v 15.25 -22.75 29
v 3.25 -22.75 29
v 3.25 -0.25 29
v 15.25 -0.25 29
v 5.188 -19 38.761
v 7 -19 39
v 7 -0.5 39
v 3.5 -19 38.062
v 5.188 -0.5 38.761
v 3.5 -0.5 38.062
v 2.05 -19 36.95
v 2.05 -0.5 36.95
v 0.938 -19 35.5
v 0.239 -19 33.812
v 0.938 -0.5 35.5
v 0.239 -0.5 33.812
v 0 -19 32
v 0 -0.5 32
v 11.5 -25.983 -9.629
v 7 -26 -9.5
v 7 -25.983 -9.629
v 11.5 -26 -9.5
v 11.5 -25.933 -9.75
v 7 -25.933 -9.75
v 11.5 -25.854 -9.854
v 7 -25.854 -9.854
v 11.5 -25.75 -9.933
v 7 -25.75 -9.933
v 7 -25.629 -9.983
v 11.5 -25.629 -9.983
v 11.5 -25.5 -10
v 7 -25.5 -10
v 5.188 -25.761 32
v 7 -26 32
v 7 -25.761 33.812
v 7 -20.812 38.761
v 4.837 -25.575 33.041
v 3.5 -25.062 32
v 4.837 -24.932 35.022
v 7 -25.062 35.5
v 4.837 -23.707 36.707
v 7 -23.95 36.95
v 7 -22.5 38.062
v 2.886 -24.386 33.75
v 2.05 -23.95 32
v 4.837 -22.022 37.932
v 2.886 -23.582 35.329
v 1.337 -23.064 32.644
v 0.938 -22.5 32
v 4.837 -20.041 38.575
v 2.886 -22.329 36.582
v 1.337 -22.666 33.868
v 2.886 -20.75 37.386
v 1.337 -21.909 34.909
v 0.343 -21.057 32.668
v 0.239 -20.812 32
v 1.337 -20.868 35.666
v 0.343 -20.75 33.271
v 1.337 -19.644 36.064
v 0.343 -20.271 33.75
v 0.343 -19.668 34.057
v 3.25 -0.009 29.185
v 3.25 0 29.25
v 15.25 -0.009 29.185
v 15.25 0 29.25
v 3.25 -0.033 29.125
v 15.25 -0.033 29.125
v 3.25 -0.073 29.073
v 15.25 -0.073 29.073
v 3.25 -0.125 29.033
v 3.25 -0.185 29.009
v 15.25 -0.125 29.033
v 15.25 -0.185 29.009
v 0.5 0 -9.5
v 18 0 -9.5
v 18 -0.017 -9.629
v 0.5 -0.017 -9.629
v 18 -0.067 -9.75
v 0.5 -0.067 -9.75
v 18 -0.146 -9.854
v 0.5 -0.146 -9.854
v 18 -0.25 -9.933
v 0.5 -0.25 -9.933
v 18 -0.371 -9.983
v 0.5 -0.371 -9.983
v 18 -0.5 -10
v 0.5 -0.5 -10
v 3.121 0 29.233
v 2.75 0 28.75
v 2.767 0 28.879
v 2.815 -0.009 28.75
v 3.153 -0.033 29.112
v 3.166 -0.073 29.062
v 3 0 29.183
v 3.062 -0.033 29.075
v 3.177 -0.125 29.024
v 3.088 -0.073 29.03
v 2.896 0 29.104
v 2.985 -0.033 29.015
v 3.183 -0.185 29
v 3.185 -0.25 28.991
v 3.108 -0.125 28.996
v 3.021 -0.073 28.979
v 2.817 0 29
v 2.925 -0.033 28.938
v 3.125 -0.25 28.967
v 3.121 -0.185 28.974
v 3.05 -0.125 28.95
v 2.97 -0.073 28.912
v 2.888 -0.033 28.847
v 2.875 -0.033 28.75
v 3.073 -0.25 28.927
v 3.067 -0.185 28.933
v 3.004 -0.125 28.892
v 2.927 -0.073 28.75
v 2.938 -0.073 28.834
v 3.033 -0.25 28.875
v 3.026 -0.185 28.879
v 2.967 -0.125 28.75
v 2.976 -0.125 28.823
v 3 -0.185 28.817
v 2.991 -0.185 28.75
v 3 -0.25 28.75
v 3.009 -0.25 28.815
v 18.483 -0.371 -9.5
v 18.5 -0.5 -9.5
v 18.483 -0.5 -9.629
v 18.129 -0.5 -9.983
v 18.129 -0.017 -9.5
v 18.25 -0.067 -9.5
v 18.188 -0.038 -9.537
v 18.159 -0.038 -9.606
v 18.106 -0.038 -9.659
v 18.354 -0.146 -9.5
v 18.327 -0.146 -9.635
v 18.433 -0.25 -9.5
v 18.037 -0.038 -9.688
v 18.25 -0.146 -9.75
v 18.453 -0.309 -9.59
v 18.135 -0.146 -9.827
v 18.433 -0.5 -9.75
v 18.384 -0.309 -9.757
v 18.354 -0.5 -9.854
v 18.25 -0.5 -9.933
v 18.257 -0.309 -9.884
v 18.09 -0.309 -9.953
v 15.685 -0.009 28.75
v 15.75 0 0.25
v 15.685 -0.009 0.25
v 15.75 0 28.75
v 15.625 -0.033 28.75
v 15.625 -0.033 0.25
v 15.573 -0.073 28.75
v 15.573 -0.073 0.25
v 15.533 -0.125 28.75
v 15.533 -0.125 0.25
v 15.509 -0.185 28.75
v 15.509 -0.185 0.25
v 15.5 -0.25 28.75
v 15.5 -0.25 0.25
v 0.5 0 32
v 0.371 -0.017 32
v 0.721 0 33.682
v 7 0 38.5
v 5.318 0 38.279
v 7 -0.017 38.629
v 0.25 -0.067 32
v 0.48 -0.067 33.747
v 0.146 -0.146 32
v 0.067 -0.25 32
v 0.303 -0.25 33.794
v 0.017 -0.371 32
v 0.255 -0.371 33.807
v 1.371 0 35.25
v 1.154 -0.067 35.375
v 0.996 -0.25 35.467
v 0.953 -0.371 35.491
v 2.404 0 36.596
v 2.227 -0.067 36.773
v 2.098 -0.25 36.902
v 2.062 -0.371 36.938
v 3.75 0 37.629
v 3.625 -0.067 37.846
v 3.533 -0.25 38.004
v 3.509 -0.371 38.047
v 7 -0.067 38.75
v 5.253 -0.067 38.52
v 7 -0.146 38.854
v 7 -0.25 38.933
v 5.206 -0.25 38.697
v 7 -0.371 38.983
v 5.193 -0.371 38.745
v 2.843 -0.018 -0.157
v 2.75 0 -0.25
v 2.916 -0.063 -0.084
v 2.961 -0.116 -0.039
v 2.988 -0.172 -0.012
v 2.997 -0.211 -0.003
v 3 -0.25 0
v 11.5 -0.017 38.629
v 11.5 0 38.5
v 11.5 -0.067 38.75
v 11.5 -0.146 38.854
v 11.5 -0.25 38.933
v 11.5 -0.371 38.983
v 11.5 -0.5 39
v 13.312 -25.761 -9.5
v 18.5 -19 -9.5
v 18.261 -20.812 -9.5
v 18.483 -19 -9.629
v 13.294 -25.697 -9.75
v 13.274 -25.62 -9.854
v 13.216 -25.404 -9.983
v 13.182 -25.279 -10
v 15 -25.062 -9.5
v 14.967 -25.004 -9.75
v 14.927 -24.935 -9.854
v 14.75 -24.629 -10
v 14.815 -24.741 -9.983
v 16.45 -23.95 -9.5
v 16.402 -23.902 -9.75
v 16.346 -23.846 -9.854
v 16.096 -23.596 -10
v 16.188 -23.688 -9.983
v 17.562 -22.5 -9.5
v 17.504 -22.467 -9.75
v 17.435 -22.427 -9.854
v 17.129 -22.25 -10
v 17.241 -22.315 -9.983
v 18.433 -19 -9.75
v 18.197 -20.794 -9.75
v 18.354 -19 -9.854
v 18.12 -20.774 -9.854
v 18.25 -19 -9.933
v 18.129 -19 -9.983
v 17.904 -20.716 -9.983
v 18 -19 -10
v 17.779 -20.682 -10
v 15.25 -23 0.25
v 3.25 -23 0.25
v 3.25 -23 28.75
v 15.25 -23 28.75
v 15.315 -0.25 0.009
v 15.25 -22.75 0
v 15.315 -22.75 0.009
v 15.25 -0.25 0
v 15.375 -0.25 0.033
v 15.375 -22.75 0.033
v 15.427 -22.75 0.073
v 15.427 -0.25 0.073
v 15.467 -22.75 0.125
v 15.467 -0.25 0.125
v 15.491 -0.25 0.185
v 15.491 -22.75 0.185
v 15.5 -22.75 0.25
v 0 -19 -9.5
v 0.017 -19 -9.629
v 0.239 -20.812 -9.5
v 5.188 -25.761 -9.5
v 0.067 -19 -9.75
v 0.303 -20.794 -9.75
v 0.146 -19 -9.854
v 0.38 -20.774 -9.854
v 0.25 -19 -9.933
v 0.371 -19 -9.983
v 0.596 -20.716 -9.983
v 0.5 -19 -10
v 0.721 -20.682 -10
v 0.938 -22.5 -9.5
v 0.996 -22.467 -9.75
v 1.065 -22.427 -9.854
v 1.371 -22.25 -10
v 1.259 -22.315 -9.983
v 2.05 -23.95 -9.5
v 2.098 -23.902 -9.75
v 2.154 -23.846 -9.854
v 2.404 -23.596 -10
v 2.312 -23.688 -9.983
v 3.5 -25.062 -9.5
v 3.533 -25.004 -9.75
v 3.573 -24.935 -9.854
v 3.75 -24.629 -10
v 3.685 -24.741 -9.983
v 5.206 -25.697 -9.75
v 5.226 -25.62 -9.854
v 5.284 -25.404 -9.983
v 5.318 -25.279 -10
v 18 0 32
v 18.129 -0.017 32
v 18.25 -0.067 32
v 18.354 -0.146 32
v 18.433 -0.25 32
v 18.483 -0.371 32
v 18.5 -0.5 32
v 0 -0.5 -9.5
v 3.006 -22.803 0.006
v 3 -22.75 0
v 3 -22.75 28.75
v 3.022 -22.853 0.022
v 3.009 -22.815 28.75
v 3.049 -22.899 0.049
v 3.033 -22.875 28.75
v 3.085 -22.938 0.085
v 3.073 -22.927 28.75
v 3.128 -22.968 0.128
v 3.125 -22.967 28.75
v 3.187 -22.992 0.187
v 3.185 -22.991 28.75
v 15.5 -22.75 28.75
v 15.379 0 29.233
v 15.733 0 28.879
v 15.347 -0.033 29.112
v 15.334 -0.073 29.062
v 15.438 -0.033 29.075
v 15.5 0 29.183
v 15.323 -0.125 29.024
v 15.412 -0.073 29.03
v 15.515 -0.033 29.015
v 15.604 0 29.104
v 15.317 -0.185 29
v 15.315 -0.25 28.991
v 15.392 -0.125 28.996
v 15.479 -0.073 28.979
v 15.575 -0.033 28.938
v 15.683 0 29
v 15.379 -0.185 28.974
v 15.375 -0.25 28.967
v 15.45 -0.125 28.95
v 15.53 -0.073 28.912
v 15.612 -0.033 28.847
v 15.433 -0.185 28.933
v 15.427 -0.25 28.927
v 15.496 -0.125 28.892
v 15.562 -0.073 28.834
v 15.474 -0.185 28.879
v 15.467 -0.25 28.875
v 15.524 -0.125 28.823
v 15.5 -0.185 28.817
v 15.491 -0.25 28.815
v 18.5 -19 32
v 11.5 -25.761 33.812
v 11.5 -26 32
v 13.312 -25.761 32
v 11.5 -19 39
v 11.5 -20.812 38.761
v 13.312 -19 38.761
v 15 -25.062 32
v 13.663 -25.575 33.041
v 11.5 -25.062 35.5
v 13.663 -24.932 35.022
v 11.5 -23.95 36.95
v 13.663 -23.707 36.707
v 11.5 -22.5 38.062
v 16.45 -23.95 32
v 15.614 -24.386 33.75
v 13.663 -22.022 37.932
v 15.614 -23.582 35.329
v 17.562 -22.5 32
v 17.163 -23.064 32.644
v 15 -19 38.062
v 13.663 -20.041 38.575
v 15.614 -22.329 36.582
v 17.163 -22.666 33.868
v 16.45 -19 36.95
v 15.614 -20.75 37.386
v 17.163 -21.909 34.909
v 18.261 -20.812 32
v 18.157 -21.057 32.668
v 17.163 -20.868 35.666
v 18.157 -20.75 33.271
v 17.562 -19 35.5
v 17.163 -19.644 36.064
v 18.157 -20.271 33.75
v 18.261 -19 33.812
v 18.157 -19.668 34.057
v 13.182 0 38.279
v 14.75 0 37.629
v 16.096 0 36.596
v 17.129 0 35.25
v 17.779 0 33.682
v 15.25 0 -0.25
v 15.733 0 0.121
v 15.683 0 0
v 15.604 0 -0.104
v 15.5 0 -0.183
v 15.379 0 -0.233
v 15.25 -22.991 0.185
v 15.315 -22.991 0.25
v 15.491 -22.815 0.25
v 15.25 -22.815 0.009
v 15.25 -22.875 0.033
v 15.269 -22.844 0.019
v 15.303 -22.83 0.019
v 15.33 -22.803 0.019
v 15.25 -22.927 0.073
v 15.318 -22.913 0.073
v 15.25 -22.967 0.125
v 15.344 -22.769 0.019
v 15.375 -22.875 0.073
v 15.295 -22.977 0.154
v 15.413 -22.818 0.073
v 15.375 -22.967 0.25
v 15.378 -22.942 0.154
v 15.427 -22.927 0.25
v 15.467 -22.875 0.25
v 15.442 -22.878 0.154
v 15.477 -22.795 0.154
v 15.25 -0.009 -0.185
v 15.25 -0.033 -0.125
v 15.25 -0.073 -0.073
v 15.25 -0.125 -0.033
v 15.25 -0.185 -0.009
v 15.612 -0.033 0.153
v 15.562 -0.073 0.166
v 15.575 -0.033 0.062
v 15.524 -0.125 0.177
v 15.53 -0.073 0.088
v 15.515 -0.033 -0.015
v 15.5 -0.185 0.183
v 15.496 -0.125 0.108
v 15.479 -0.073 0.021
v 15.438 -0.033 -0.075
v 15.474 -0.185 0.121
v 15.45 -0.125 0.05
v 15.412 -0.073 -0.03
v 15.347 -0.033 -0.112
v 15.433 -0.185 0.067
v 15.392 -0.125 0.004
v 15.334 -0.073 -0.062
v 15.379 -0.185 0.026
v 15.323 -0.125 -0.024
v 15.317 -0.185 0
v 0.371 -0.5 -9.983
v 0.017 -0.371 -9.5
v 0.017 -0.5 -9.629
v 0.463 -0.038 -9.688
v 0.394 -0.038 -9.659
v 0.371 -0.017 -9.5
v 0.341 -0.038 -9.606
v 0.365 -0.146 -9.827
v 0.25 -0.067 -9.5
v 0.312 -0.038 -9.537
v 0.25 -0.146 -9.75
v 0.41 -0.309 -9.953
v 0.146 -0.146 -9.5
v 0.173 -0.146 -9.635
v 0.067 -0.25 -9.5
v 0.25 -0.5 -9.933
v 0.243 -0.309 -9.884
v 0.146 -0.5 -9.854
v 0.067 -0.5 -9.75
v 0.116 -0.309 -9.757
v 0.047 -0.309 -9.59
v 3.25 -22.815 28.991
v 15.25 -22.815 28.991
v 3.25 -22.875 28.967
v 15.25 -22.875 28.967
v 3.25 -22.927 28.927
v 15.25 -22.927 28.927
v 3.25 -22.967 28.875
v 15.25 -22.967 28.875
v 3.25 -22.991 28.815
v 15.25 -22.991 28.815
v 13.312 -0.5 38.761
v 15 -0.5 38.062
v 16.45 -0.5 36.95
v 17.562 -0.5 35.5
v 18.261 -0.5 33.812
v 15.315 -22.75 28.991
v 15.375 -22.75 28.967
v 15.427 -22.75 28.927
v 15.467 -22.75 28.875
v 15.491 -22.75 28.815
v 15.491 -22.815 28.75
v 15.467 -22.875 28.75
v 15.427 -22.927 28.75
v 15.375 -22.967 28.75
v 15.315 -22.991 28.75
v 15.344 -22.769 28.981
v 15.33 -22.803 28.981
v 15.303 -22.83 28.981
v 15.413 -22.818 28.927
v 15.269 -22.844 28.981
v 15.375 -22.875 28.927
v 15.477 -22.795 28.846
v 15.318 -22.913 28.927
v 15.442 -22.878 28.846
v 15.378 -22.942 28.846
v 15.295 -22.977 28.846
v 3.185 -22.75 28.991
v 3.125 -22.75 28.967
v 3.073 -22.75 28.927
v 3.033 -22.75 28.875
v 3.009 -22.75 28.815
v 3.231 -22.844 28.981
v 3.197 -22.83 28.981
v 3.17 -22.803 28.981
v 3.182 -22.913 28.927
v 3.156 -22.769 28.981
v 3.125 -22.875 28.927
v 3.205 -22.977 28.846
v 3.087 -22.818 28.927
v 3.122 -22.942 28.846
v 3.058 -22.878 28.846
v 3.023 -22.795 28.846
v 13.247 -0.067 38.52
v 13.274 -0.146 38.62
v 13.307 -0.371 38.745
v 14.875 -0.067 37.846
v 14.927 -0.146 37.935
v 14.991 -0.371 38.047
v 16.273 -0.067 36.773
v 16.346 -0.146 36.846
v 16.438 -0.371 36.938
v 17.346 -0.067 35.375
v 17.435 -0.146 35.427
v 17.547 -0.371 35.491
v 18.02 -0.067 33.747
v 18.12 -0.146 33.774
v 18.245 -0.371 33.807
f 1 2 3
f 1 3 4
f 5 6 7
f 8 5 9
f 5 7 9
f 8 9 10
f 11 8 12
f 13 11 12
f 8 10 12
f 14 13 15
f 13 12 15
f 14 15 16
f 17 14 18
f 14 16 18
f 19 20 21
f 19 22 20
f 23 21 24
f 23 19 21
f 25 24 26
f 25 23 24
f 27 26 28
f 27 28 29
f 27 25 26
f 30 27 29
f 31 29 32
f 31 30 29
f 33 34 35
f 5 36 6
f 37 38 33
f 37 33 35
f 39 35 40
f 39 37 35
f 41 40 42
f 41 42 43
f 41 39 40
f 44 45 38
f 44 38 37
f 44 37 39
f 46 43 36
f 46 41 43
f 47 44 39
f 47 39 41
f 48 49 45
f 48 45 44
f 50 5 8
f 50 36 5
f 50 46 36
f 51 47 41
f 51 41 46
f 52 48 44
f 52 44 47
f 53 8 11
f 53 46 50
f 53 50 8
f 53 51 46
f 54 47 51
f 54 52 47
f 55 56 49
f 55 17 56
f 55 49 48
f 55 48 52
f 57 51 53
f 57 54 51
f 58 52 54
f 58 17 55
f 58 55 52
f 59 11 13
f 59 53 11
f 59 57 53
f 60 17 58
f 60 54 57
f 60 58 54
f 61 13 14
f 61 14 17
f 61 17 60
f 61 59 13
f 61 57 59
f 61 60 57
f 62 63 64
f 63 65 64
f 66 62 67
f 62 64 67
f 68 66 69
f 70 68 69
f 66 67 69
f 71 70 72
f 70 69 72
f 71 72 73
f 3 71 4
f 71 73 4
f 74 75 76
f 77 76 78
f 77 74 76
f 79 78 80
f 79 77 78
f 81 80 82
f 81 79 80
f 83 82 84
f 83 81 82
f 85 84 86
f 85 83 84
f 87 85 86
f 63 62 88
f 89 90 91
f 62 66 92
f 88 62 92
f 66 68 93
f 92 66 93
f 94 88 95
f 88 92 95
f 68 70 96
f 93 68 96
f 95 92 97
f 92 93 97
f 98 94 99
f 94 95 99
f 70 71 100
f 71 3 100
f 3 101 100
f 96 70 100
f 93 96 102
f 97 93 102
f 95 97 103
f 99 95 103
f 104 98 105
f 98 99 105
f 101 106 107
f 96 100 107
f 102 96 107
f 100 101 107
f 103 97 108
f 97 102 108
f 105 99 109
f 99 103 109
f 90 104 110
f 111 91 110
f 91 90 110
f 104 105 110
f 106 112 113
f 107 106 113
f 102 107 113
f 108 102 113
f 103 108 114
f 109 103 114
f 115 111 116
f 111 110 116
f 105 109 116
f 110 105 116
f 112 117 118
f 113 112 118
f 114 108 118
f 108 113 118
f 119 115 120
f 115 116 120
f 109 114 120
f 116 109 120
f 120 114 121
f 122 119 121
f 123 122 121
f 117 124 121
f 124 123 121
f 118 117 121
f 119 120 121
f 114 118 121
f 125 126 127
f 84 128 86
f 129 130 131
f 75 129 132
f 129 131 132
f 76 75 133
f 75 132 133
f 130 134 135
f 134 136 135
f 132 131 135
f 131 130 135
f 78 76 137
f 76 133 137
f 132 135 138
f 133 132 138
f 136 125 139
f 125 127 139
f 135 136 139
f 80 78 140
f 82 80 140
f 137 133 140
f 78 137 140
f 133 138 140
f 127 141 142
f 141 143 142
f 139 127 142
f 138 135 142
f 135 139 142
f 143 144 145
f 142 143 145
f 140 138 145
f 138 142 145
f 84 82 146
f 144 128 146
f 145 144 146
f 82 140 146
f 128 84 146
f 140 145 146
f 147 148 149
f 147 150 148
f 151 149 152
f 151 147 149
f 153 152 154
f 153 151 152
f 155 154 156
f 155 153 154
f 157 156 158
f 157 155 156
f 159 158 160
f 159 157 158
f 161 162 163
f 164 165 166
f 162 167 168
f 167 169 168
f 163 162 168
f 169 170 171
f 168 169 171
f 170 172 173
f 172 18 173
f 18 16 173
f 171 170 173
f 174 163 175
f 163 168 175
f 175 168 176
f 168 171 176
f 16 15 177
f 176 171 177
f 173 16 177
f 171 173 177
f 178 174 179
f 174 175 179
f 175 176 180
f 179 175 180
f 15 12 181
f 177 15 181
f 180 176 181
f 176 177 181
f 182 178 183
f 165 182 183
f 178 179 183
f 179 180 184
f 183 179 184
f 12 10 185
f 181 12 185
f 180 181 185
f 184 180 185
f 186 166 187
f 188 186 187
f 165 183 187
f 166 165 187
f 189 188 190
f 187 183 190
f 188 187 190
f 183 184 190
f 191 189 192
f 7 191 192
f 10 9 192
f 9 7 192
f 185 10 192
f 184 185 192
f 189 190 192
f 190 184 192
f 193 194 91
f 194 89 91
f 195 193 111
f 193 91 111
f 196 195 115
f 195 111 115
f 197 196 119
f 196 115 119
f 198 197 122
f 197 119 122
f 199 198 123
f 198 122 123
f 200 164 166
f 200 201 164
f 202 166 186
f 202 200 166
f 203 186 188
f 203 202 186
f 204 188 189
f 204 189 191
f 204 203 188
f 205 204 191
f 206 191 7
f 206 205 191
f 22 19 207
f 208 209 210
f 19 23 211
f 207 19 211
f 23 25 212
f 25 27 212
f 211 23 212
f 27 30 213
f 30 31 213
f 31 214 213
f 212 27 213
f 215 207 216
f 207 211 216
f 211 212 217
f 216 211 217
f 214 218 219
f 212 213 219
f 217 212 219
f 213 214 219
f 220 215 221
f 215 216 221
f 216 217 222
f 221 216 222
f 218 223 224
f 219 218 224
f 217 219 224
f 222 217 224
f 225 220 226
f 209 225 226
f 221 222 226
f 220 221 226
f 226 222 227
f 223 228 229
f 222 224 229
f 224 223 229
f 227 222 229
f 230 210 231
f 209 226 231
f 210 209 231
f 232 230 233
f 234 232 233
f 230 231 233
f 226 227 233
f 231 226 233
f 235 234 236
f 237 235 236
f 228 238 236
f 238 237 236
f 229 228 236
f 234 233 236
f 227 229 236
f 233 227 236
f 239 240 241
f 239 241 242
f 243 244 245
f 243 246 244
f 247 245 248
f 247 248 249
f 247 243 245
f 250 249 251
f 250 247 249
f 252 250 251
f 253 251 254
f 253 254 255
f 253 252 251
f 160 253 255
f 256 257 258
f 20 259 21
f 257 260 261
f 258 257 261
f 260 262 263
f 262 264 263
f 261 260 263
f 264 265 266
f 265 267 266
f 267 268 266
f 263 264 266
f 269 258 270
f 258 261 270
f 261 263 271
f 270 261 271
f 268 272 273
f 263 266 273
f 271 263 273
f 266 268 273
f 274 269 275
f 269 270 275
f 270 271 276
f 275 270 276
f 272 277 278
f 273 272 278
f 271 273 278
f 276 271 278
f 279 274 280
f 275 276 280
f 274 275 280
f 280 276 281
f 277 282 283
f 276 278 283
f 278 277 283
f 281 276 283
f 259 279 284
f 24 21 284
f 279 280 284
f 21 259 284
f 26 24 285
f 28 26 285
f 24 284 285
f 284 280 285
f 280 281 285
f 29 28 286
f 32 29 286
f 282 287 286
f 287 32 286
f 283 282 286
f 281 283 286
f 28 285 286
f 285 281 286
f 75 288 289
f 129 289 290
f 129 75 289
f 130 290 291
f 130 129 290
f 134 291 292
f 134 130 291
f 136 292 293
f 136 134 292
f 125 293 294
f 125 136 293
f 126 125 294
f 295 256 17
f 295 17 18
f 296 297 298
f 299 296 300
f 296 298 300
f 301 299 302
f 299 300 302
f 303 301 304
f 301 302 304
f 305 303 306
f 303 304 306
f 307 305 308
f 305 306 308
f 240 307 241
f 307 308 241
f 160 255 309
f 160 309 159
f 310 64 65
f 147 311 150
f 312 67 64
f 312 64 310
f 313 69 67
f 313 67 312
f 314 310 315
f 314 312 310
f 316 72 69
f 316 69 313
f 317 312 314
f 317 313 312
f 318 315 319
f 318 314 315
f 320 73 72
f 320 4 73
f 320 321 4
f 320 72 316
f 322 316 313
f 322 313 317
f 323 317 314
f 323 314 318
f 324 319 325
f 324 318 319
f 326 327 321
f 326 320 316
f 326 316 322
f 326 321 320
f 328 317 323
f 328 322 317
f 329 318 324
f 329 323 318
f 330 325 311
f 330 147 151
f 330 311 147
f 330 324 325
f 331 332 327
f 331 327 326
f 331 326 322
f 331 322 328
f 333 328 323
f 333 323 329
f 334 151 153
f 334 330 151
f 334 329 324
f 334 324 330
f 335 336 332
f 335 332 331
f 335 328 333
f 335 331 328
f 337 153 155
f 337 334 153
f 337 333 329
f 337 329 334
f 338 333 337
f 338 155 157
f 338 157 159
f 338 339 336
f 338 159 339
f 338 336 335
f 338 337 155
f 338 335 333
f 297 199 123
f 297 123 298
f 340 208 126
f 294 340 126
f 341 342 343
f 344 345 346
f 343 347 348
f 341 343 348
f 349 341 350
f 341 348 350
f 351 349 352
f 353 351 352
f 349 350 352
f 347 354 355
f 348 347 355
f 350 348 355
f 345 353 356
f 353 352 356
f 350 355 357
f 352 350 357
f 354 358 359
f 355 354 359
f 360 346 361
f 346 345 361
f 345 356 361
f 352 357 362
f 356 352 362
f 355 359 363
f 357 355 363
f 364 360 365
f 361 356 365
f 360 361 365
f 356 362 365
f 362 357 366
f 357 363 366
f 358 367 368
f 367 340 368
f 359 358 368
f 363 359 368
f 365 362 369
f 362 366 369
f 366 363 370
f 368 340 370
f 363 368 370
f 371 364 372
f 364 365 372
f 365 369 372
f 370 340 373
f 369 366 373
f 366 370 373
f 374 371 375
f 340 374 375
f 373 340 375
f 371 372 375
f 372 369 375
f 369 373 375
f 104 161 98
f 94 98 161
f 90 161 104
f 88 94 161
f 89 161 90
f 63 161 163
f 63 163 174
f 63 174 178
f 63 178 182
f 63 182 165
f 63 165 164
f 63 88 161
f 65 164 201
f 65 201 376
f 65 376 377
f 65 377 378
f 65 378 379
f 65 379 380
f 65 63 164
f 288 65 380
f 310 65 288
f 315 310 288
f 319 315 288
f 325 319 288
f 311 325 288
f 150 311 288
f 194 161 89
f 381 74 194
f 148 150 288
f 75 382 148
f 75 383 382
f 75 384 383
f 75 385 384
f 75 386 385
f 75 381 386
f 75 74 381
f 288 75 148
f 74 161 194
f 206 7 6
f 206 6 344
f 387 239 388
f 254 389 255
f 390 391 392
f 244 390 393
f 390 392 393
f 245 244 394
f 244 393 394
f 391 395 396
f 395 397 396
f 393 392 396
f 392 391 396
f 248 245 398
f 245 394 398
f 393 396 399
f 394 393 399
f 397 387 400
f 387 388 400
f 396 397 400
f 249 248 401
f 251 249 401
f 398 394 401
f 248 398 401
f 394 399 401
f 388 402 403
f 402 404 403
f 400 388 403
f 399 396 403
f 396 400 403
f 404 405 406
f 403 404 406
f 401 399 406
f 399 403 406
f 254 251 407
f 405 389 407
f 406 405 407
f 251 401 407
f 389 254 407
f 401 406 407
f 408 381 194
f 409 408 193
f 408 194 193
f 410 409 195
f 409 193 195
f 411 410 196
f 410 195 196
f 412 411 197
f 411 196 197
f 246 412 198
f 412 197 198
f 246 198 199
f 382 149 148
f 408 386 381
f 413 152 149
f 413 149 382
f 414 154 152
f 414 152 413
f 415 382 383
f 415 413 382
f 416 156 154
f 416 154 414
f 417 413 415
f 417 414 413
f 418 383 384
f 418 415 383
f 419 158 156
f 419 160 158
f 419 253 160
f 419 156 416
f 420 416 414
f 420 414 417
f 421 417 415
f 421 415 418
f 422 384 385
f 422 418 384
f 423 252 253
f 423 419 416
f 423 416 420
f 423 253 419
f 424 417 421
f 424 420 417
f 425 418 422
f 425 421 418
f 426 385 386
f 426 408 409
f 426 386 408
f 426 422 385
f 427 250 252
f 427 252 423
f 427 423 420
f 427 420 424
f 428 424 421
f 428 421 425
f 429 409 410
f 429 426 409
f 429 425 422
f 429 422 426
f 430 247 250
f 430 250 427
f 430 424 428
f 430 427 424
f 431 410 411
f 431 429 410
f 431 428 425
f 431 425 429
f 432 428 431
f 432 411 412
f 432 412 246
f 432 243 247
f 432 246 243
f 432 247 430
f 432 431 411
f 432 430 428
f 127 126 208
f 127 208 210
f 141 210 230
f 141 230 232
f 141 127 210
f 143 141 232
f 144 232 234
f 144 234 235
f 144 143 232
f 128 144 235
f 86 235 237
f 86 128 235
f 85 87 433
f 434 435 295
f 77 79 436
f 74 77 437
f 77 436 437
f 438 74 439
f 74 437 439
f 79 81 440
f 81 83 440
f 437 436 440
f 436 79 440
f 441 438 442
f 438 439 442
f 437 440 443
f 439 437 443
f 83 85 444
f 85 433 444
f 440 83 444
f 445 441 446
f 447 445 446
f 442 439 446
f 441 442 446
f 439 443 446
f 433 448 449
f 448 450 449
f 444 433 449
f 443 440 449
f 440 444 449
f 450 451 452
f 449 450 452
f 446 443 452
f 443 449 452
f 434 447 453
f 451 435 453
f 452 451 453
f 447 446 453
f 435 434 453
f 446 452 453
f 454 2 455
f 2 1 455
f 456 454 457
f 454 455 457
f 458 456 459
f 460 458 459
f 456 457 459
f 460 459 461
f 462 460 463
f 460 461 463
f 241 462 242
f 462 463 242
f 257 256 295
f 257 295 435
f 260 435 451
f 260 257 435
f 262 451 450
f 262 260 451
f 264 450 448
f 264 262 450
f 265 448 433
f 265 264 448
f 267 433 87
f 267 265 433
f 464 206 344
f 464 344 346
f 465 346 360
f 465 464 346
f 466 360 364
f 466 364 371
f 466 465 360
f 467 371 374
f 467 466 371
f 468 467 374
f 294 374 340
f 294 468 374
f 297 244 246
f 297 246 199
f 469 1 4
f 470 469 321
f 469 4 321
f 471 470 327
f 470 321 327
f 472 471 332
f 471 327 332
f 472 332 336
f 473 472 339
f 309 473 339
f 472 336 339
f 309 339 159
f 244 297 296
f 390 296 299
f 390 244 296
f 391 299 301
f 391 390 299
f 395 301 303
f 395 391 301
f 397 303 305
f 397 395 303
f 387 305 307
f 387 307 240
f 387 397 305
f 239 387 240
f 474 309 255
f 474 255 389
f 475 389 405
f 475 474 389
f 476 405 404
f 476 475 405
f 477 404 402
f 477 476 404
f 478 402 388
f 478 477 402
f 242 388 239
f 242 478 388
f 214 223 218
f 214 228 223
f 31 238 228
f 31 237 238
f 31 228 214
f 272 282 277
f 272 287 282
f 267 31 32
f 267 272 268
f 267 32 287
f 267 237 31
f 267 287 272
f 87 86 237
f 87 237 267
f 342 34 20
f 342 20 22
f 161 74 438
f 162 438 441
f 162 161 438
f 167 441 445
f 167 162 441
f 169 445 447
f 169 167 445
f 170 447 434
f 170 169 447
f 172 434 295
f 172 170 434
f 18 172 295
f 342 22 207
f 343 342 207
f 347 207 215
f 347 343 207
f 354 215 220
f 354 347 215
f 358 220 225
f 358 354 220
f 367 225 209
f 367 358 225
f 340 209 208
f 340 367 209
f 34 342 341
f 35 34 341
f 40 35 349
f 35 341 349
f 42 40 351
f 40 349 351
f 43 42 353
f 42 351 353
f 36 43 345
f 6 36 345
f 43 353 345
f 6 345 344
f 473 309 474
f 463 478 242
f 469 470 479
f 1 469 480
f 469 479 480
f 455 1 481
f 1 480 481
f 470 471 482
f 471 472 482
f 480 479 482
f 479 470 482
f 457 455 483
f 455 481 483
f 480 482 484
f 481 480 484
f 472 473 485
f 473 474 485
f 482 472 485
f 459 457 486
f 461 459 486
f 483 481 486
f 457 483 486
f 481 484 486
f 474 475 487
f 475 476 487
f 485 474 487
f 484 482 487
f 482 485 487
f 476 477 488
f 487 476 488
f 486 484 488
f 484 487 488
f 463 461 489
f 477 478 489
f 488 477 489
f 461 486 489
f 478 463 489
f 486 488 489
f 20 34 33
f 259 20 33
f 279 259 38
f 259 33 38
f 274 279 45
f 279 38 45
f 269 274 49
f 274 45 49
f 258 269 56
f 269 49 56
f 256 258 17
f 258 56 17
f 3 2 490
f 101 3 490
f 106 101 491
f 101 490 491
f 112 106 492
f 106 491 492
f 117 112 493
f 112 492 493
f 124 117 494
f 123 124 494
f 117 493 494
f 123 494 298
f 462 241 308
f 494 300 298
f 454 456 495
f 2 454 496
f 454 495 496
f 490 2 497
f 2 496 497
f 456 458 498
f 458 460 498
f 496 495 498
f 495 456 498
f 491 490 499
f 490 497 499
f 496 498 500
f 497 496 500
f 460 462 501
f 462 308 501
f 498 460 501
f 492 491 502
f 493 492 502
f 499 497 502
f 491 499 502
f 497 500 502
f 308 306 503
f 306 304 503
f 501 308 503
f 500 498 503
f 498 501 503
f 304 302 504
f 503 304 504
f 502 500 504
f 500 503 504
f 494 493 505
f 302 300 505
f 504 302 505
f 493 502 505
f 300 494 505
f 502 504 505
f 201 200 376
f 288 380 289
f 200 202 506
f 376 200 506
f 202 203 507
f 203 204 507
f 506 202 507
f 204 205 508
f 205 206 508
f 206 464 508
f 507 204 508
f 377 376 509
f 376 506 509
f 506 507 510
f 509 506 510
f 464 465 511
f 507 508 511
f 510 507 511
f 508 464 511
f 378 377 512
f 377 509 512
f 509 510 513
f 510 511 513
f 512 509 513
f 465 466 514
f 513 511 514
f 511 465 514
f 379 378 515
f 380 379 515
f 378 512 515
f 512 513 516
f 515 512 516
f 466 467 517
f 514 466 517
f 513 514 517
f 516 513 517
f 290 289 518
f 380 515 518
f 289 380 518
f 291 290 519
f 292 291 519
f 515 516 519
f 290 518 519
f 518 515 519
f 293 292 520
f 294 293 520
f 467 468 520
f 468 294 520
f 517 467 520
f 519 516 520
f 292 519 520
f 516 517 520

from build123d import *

# Parameters (mm, degrees)
BOSS_EXTRU_1_DEPTH = 29
ESQUISSE2_W        = 18.5
ESQUISSE2_H        = 26
BOSS_EXTRU_2_DEPTH = 10
ESQUISSE3_W        = 18.5
ESQUISSE3_H        = 26
BOSS_EXTRU_3_DEPTH = 10
CONG_3_R           = 7
CONG_4_R           = 7
CONG_5_R           = 7
CONG_6_R           = 0.5
CONG_7_R           = 0.5
CONG_8_R           = 0.25


with BuildPart() as part:
    # Esquisse1 → Boss.-Extru.1 (new body)
    with BuildSketch(Plane.XY):
        Polygon((0, 0), (3, 0), (3, -23), (15.5, -23), (15.5, 0), (18.5, 0), (18.5, -26), (0, -26), align=None)
    extrude(amount=BOSS_EXTRU_1_DEPTH)

    # Esquisse2 → Boss.-Extru.2 (add)
    with BuildSketch(Plane(origin=(0, 0, 0), x_dir=(-1, 0, 0), z_dir=(0, 0, -1))):
        with Locations((-9.25, -13)):
            Rectangle(ESQUISSE2_W, ESQUISSE2_H)
    extrude(amount=BOSS_EXTRU_2_DEPTH)

    # Esquisse3 → Boss.-Extru.3 (add)
    with BuildSketch(Plane.XY.offset(29)):
        with Locations((9.25, -13)):
            Rectangle(ESQUISSE3_W, ESQUISSE3_H)
    extrude(amount=BOSS_EXTRU_3_DEPTH)

    # Congé3
    cong_3_edges = [part.edges().sort_by_distance(p)[0] for p in [
        (9.25, -26, 39),
    ]]
    fillet(cong_3_edges, radius=CONG_3_R)

    # Congé4
    cong_4_edges = [part.edges().sort_by_distance(p)[0] for p in [
        (18.5, -9.5, 39),
        (18.5, -26, 11),
        (18.5, -23.949747468, 36.949747468),
    ]]
    fillet(cong_4_edges, radius=CONG_4_R)

    # Congé5
    cong_5_edges = [part.edges().sort_by_distance(p)[0] for p in [
        (0, -9.5, 39),
        (0, -26, 11),
        (0, -23.949747468, 36.949747468),
    ]]
    fillet(cong_5_edges, radius=CONG_5_R)

    # Congé6
    cong_6_edges = [part.edges().sort_by_distance(p)[0] for p in [
        (18.5, -9.5, -10),
        (9.25, -26, -10),
        (16.449747468, -23.949747468, -10),
        (0, -9.5, -10),
        (2.050252532, -23.949747468, -10),
    ]]
    fillet(cong_6_edges, radius=CONG_6_R)

    # Congé7
    cong_7_edges = [part.edges().sort_by_distance(p)[0] for p in [
        (9.25, 0, 39),
        (18.5, 0, 11.25),
        (16.449747468, 0, 36.949747468),
        (0, 0, 11.25),
        (2.050252532, 0, 36.949747468),
        (9.25, 0, -10),
        (0.146446609, 0, -9.853553391),
        (18.353553391, 0, -9.853553391),
    ]]
    fillet(cong_7_edges, radius=CONG_7_R)

    # Congé8
    cong_8_edges = [part.edges().sort_by_distance(p)[0] for p in [
        (3, 0, 14.5),
        (3, -23, 14.5),
        (15.5, -23, 14.5),
        (15.5, 0, 14.5),
        (15.5, -11.5, 29),
        (9.25, -23, 29),
        (3, -11.5, 29),
        (9.25, 0, 0),
        (9.25, 0, 29),
        (9.25, -23, 0),
        (15.5, -11.5, 0),
    ]]
    fillet(cong_8_edges, radius=CONG_8_R)


solid = part.part
